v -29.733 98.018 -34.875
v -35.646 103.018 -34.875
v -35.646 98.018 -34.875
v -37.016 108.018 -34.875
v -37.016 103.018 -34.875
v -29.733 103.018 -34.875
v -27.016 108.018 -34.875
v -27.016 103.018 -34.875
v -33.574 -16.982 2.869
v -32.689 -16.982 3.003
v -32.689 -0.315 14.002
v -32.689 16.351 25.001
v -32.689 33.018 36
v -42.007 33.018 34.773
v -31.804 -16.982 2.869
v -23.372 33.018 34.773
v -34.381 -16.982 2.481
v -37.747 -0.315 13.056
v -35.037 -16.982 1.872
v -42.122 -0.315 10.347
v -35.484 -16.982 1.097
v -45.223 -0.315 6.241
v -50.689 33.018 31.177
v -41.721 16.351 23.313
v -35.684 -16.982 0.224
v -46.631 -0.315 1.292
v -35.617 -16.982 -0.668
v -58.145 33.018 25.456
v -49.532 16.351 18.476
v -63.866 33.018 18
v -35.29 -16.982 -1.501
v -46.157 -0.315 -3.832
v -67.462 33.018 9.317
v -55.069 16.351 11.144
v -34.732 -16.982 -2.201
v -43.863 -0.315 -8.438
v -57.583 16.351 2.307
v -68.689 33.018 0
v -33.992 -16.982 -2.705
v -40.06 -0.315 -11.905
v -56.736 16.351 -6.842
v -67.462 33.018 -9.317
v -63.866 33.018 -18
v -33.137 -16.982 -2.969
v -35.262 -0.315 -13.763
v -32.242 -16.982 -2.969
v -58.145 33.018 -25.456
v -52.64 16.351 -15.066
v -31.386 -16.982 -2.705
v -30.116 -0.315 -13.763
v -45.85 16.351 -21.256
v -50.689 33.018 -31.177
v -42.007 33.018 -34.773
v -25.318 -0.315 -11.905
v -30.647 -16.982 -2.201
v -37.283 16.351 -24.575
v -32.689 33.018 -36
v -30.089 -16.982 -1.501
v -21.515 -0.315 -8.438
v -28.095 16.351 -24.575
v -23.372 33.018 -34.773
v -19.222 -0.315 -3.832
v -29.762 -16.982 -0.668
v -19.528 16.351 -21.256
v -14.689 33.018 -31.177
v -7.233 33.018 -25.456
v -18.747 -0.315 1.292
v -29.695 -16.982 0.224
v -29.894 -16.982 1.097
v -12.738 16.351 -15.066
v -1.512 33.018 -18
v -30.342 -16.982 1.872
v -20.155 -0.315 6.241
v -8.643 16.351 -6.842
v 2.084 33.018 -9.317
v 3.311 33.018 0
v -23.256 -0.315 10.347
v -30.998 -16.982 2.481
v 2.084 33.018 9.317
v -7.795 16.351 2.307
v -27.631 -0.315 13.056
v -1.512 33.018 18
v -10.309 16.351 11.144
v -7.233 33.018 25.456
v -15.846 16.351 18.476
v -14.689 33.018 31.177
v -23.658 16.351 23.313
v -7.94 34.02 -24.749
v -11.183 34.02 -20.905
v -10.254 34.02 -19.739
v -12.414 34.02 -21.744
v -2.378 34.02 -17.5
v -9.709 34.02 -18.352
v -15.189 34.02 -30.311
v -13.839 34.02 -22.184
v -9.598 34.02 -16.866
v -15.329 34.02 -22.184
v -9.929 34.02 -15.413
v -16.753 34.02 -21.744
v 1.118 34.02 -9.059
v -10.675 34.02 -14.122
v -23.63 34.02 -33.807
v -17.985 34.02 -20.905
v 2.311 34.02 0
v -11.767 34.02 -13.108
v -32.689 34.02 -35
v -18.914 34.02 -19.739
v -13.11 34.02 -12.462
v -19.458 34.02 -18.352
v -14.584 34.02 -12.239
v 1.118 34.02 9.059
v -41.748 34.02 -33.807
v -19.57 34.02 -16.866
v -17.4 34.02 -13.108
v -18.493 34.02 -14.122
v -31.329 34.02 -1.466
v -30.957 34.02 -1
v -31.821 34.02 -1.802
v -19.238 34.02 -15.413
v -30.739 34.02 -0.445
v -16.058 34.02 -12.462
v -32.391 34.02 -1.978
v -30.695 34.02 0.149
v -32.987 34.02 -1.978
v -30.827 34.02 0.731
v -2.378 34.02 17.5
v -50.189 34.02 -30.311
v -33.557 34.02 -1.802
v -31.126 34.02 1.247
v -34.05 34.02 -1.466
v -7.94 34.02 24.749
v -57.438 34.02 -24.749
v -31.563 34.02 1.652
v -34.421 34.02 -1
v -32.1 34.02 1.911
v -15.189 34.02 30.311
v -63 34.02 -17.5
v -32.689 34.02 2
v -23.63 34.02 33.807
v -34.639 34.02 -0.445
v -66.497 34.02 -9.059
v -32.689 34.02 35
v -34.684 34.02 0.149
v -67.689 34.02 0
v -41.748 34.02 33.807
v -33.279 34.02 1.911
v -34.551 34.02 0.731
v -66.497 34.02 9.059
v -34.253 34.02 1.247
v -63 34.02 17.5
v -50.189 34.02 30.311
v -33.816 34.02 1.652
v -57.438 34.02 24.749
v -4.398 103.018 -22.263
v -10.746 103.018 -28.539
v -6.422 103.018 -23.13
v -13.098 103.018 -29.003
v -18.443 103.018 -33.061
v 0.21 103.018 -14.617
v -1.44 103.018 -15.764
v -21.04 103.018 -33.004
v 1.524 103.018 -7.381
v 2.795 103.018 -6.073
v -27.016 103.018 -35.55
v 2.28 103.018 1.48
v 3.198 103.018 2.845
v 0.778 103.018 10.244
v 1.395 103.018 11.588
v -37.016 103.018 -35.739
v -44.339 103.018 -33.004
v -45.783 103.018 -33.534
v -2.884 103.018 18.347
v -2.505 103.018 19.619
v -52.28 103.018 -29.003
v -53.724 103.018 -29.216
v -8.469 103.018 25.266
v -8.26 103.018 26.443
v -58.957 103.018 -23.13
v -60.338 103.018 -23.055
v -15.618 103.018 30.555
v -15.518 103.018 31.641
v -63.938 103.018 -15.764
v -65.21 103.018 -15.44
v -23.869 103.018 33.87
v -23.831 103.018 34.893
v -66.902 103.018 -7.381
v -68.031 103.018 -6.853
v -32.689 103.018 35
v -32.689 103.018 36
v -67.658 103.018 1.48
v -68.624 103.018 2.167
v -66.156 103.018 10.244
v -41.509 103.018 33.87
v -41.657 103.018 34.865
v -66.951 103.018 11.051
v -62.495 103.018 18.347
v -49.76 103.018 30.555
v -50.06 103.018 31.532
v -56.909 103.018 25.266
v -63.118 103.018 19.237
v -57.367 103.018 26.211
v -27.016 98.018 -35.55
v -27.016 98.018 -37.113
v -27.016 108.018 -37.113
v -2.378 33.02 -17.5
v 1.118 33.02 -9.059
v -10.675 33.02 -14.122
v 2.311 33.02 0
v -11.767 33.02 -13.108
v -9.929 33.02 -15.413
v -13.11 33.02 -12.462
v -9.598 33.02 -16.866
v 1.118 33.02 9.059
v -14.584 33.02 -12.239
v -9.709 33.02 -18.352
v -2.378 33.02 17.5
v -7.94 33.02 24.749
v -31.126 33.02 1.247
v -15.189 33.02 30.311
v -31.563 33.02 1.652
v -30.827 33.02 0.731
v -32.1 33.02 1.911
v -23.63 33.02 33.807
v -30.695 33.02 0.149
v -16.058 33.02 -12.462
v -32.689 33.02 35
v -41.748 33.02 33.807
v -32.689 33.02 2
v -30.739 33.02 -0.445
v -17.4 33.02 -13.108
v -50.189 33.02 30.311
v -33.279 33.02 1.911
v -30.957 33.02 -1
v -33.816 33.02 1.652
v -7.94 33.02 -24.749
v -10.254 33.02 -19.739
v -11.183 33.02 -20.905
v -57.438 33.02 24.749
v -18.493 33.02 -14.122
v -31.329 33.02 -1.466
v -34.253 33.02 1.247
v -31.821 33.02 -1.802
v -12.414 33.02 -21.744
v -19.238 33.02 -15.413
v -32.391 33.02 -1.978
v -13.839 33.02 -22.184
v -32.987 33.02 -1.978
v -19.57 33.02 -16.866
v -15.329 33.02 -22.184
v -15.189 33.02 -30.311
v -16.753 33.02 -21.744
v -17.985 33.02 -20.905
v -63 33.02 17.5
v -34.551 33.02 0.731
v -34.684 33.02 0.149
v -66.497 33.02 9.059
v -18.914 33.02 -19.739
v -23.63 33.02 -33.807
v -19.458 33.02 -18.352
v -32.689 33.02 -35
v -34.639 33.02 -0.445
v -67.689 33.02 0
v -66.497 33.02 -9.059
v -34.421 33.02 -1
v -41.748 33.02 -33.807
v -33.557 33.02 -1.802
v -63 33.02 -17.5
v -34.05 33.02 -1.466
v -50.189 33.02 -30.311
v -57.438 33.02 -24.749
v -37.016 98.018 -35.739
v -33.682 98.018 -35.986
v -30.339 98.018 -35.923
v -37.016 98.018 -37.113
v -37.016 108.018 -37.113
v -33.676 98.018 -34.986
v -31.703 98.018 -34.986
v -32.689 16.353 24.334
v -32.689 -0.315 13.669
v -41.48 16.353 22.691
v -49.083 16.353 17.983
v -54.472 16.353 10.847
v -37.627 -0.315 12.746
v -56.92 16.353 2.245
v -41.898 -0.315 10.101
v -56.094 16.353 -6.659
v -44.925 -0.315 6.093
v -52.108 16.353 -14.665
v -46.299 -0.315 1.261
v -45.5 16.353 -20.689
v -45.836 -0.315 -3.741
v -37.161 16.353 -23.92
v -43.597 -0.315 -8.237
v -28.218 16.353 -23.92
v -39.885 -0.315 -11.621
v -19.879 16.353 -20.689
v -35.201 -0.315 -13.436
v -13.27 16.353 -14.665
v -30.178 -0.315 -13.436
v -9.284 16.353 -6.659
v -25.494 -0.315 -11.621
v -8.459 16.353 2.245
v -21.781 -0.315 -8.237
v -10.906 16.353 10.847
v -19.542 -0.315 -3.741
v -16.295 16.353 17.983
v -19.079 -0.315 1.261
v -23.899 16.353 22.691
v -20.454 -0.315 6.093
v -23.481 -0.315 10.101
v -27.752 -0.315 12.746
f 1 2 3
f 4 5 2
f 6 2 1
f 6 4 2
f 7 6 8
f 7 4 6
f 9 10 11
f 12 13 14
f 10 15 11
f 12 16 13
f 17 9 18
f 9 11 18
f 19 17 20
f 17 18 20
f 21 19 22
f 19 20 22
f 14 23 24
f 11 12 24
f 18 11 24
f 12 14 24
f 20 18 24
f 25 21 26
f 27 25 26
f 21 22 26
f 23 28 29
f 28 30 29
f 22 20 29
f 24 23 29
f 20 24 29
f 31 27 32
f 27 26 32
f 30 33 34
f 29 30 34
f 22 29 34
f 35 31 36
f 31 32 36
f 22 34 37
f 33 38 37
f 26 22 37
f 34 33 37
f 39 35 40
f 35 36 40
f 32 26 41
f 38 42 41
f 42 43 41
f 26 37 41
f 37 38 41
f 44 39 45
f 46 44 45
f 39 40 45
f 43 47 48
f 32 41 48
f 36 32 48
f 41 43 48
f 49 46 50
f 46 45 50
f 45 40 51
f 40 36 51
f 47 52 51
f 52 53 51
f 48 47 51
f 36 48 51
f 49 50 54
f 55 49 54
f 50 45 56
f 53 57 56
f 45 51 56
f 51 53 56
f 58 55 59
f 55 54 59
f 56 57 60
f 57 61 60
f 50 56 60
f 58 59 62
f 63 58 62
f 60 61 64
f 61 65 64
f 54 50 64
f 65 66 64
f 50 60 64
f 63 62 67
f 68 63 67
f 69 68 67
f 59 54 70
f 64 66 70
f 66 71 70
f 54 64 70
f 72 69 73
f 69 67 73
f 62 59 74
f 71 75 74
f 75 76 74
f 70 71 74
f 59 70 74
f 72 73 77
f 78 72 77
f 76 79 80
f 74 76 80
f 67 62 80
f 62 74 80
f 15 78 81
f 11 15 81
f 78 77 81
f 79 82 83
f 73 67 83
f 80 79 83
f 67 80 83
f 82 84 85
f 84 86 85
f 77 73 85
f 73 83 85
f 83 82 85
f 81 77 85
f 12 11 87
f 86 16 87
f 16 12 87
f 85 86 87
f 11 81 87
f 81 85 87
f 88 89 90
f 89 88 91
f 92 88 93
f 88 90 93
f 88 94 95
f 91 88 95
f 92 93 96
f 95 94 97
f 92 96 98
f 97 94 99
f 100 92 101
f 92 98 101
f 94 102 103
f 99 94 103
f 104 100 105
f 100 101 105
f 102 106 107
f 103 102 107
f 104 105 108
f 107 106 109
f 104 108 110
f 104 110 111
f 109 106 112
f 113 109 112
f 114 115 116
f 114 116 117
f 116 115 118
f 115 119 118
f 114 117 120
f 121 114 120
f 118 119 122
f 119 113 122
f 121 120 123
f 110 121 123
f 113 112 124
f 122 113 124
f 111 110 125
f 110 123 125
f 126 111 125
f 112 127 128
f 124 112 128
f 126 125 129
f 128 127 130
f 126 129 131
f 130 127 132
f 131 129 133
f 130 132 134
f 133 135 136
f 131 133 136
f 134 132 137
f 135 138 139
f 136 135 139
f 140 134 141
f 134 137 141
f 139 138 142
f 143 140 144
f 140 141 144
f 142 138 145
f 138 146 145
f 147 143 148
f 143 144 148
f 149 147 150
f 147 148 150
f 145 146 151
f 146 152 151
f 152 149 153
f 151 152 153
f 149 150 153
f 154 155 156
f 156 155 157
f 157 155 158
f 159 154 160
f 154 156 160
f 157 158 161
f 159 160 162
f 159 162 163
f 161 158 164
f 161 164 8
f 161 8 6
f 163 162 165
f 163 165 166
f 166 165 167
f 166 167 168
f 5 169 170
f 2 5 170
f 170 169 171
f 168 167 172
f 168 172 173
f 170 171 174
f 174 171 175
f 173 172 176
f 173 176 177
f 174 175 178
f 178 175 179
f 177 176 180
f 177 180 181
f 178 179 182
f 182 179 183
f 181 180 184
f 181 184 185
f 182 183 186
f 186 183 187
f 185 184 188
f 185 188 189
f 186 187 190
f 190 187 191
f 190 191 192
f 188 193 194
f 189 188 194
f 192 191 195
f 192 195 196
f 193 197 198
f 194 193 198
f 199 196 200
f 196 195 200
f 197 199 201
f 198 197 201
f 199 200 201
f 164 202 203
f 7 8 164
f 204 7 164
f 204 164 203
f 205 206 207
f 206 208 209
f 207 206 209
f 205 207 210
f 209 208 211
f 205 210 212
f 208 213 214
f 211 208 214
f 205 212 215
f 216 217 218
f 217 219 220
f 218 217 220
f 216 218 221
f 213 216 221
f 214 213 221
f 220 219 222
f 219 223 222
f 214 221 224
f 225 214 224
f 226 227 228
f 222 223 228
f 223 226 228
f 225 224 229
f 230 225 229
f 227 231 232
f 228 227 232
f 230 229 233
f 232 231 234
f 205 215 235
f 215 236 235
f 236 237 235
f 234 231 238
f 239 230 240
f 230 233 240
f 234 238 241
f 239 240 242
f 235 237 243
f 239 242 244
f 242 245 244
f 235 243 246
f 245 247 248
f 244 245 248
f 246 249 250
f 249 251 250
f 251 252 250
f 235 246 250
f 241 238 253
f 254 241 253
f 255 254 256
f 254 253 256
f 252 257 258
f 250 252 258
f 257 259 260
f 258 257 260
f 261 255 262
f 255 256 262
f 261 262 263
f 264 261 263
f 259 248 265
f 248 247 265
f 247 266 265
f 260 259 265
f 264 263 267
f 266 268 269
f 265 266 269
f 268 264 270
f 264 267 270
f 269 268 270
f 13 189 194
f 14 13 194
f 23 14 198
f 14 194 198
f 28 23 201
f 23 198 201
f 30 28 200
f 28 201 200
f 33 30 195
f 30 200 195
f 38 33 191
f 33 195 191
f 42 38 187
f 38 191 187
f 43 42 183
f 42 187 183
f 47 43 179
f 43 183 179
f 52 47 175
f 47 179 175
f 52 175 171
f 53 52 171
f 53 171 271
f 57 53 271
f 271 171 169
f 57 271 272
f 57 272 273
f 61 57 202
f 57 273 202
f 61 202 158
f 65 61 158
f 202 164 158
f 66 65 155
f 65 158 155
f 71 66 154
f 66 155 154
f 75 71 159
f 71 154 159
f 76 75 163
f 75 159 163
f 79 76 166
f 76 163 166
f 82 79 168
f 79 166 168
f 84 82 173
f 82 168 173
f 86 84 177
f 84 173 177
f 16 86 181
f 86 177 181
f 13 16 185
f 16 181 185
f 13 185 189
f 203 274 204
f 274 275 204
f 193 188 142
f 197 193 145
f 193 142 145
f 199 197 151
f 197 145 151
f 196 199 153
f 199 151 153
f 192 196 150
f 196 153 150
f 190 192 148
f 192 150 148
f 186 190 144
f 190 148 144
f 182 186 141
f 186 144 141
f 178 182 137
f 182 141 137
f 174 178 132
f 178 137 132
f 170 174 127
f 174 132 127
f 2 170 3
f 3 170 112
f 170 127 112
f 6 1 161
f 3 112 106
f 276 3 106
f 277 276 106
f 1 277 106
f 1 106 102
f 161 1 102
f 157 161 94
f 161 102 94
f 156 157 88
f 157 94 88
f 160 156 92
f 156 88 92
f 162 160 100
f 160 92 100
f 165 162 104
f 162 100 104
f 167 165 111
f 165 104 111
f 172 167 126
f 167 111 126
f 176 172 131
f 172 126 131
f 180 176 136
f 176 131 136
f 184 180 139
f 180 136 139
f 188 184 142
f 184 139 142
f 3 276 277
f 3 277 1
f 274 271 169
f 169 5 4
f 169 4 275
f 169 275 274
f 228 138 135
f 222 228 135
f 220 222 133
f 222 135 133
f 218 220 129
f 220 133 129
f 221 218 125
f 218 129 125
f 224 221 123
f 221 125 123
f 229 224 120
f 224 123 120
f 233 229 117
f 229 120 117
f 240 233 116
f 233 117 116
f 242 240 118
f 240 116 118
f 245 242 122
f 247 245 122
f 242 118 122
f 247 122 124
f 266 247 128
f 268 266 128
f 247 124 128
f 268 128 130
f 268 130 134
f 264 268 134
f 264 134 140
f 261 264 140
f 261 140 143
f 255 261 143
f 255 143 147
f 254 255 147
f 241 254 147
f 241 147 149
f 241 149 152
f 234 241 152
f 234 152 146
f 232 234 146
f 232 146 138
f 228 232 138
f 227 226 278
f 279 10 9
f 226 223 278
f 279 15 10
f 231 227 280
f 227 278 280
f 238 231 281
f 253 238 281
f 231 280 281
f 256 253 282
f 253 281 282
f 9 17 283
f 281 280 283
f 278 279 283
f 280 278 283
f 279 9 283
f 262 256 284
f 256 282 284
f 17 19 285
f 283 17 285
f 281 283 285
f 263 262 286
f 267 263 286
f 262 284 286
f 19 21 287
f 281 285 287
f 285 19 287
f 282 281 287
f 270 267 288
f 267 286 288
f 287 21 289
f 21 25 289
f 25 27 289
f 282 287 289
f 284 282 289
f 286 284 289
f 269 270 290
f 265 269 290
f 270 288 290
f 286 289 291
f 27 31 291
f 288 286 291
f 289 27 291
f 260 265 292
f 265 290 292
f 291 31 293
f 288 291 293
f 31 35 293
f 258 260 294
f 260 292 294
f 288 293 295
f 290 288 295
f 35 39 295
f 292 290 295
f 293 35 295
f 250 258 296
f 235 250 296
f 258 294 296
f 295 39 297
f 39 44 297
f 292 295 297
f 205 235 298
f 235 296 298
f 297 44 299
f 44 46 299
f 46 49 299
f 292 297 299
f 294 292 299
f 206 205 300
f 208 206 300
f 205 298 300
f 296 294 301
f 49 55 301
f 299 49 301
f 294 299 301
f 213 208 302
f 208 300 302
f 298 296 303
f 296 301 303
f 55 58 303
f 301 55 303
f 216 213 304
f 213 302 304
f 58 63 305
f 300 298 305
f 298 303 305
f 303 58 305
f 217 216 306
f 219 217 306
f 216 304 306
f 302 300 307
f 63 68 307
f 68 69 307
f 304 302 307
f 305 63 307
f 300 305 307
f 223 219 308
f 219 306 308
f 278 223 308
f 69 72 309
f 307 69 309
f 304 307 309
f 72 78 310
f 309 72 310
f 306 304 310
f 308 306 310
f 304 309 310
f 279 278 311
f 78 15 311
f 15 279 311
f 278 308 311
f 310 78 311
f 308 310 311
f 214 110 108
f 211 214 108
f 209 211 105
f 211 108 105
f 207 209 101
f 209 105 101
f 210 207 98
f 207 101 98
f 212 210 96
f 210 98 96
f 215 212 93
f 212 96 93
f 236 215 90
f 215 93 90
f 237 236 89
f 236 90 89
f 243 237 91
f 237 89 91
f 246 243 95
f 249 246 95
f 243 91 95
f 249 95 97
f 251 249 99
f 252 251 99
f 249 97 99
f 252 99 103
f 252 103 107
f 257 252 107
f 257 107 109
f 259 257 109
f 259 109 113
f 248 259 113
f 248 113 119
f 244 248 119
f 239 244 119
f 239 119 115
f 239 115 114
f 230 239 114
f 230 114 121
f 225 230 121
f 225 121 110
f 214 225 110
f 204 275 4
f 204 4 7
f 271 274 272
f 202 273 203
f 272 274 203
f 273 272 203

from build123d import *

# Parameters (mm, degrees)
SKETCH2_R           = 2
SKETCH2_R_2         = 5
CUT_EXTRUDE1_DEPTH  = 3
SKETCH3_W           = 10
SKETCH3_H           = 2.237585103
BOSS_EXTRUDE1_DEPTH = 5


with BuildPart() as part:
    # Sketch1 → Revolve1 (revolve)
    with BuildSketch(Plane.XY, mode=Mode.PRIVATE) as revolve1_sk:
        Polygon((2.310834394, 103.017979097), (2.310834394, 34.01998915), (-32.689165606, 34.01998915), (-32.689165606, 33.01998915), (2.310836414, 33.01998915), (-29.686396209, -16.982020903), (3.310834394, 33.017979097), (3.310834394, 103.017979097), align=None)
    revolve(revolve1_sk.sketch.rotate(Axis((-32.689165606, 34.01998915, 0), (0, -1, 0)), 90), axis=Axis((-32.689165606, 34.01998915, 0), (0, -1, 0)))

    # Sketch2 → Cut-Extrude1 (cut)
    with BuildSketch(Plane(origin=(0, 34.01998915, 0), x_dir=(1, 0, 0), z_dir=(0, 1, 0))):
        with Locations(Location((-32.689165606, 0, 0), (0, 0, 270))):
            Circle(SKETCH2_R)
        with Locations(Location((-14.583845408, 17.239413579, 0), (0, 0, 270))):
            Circle(SKETCH2_R_2)
    extrude(amount=-CUT_EXTRUDE1_DEPTH, mode=Mode.SUBTRACT)

    # Sketch3 → Boss-Extrude1 (add, symmetric)
    with BuildSketch(Plane(origin=(0, 103.017979097, 0), x_dir=(1, 0, 0), z_dir=(0, 1, 0))):
        with Locations((-32.016176603, 35.993708975)):
            Rectangle(SKETCH3_W, SKETCH3_H)
    extrude(amount=BOSS_EXTRUDE1_DEPTH, both=True)


solid = part.part
